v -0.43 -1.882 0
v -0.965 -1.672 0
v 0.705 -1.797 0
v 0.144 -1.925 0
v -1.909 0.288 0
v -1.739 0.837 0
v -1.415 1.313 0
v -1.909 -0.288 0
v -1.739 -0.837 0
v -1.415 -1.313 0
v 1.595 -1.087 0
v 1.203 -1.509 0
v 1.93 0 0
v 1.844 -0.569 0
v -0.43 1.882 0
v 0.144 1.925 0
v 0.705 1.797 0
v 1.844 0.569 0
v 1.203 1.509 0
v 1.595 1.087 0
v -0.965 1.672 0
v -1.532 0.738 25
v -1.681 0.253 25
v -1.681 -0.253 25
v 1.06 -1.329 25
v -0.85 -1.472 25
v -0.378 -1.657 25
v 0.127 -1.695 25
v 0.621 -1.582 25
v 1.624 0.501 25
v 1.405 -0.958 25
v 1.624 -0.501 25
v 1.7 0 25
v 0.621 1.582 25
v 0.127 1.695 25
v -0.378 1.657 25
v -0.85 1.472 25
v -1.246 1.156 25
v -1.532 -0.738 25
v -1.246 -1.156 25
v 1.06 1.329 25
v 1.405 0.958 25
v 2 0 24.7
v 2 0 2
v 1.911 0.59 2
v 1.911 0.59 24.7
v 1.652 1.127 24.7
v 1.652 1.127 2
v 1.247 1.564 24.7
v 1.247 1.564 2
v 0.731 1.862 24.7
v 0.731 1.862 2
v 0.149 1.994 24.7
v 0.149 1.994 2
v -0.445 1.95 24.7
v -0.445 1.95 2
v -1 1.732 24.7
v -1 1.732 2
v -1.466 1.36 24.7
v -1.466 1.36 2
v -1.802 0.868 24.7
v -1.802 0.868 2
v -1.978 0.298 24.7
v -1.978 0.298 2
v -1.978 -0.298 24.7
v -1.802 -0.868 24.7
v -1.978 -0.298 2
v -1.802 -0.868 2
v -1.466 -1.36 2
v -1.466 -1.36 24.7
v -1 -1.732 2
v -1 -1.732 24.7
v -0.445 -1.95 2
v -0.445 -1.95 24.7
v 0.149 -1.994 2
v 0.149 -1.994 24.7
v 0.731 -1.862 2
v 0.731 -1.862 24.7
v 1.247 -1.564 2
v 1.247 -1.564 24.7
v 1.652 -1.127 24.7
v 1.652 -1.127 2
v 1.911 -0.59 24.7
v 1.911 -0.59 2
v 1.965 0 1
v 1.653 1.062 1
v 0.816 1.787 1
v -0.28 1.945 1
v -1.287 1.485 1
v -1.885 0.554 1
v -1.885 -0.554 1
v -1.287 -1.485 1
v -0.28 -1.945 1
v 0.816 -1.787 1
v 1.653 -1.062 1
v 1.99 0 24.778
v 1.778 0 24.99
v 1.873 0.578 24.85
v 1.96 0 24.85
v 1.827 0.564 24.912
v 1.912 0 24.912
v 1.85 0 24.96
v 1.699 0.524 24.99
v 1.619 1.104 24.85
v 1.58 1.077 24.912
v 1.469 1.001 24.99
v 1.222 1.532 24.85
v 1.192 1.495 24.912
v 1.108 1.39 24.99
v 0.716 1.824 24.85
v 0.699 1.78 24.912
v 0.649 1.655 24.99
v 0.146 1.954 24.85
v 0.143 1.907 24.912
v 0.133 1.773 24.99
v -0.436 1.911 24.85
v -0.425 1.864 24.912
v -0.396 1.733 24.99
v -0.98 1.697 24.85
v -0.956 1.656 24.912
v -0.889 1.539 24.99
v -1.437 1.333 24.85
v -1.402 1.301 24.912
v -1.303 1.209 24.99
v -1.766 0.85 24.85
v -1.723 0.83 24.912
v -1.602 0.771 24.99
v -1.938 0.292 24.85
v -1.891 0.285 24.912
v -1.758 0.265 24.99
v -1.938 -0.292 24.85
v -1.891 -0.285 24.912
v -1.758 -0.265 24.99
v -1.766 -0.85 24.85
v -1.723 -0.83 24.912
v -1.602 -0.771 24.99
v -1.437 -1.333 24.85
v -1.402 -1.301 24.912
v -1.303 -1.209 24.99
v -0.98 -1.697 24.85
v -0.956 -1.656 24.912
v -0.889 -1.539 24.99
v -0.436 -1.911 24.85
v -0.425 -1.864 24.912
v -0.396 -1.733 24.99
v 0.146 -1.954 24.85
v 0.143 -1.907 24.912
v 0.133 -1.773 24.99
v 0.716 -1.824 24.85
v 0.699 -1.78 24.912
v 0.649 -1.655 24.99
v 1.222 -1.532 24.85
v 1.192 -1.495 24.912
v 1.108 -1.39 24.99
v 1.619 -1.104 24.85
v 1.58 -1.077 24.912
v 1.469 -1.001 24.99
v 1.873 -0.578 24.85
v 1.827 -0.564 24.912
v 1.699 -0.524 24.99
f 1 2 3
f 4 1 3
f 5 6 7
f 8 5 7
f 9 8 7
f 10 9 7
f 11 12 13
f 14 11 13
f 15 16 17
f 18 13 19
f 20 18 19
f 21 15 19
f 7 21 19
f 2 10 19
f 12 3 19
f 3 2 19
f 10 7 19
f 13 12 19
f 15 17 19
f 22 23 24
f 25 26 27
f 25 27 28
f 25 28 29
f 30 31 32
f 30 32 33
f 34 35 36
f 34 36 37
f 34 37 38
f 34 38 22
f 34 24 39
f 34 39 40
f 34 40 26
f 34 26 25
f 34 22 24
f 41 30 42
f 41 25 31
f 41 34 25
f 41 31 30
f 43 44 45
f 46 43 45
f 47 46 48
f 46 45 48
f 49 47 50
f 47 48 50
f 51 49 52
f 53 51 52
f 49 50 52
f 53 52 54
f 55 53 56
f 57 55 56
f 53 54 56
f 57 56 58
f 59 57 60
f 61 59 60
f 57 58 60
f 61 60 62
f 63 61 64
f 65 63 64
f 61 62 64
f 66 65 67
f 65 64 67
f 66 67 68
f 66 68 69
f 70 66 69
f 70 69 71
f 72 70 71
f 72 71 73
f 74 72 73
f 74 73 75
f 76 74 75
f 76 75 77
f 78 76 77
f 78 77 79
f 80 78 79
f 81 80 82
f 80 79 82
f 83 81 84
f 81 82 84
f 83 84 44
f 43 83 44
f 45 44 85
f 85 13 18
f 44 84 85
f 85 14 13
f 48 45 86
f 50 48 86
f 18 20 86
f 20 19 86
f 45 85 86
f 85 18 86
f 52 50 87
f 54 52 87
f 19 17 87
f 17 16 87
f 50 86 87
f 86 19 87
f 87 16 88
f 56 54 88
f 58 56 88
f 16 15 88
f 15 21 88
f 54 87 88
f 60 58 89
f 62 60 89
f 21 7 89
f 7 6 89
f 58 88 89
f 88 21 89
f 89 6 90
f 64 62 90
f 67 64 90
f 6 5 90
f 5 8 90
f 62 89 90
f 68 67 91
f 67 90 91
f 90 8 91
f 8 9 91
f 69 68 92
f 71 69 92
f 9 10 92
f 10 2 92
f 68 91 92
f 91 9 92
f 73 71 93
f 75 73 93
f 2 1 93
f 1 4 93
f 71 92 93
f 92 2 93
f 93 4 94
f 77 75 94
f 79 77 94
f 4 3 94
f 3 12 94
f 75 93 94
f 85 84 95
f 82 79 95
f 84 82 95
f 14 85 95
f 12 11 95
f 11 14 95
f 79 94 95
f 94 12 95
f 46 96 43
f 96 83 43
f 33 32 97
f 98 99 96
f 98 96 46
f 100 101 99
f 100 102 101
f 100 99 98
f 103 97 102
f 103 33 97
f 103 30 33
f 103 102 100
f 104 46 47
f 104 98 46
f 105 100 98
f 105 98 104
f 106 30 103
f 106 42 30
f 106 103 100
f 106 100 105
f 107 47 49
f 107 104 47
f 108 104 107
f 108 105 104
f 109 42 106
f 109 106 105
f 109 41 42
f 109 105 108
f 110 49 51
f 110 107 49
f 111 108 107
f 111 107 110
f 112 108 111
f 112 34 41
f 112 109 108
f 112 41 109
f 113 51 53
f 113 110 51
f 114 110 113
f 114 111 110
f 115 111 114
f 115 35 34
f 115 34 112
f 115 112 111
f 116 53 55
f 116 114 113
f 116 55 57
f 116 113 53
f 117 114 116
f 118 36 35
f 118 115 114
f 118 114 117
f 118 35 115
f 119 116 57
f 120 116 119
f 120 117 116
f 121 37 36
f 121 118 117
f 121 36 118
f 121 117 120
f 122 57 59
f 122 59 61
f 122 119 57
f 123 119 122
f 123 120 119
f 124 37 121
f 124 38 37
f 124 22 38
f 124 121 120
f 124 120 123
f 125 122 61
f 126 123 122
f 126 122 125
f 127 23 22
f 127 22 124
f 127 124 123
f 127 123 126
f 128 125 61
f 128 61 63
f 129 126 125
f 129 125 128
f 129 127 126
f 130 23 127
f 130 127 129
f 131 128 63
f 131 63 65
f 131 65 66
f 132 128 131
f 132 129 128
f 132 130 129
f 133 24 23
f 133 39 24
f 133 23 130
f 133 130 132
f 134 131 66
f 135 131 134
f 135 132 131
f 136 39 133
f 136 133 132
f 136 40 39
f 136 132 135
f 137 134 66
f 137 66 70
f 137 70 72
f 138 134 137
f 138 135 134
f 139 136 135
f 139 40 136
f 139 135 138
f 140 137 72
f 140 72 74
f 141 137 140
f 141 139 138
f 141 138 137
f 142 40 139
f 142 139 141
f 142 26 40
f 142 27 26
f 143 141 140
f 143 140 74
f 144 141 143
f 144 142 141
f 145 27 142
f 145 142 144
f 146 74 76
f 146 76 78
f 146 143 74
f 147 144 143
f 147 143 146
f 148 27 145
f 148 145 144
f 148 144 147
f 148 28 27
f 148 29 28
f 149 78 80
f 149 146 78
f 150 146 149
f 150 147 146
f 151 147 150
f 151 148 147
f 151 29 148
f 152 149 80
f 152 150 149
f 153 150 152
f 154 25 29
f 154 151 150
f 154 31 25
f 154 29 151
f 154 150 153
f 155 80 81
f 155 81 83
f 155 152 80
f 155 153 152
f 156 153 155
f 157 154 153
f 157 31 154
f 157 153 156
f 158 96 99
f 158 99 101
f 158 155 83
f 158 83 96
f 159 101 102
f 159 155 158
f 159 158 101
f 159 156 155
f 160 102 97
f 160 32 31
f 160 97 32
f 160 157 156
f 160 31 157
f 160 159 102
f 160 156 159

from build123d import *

# Parameters (mm, degrees)
CROQUIS1_R              = 2
SALIENTE_EXTRUIR1_DEPTH = 25
CHAFL_N1_SIZE           = 2
CHAFL_N1_SIZE2          = 0.069841539
REDONDEO1_R             = 0.3


with BuildPart() as part:
    # Croquis1 → Saliente-Extruir1 (new body)
    with BuildSketch(Plane.XY):
        Circle(CROQUIS1_R)
    extrude(amount=SALIENTE_EXTRUIR1_DEPTH)

    # Chaflán1
    chafl_n1_edges = [part.edges().sort_by_distance(p)[0] for p in [
        (-2, 0, 0),
    ]]
    chafl_n1_side = [part.faces().sort_by_distance(p)[0] for p in [
        (-2, 0, 12.5),
    ]]
    chamfer(chafl_n1_edges, length=CHAFL_N1_SIZE, length2=CHAFL_N1_SIZE2, reference=chafl_n1_side[0])

    # Redondeo1
    redondeo1_edges = [part.edges().sort_by_distance(p)[0] for p in [
        (-2, 0, 25),
    ]]
    fillet(redondeo1_edges, radius=REDONDEO1_R)


solid = part.part
